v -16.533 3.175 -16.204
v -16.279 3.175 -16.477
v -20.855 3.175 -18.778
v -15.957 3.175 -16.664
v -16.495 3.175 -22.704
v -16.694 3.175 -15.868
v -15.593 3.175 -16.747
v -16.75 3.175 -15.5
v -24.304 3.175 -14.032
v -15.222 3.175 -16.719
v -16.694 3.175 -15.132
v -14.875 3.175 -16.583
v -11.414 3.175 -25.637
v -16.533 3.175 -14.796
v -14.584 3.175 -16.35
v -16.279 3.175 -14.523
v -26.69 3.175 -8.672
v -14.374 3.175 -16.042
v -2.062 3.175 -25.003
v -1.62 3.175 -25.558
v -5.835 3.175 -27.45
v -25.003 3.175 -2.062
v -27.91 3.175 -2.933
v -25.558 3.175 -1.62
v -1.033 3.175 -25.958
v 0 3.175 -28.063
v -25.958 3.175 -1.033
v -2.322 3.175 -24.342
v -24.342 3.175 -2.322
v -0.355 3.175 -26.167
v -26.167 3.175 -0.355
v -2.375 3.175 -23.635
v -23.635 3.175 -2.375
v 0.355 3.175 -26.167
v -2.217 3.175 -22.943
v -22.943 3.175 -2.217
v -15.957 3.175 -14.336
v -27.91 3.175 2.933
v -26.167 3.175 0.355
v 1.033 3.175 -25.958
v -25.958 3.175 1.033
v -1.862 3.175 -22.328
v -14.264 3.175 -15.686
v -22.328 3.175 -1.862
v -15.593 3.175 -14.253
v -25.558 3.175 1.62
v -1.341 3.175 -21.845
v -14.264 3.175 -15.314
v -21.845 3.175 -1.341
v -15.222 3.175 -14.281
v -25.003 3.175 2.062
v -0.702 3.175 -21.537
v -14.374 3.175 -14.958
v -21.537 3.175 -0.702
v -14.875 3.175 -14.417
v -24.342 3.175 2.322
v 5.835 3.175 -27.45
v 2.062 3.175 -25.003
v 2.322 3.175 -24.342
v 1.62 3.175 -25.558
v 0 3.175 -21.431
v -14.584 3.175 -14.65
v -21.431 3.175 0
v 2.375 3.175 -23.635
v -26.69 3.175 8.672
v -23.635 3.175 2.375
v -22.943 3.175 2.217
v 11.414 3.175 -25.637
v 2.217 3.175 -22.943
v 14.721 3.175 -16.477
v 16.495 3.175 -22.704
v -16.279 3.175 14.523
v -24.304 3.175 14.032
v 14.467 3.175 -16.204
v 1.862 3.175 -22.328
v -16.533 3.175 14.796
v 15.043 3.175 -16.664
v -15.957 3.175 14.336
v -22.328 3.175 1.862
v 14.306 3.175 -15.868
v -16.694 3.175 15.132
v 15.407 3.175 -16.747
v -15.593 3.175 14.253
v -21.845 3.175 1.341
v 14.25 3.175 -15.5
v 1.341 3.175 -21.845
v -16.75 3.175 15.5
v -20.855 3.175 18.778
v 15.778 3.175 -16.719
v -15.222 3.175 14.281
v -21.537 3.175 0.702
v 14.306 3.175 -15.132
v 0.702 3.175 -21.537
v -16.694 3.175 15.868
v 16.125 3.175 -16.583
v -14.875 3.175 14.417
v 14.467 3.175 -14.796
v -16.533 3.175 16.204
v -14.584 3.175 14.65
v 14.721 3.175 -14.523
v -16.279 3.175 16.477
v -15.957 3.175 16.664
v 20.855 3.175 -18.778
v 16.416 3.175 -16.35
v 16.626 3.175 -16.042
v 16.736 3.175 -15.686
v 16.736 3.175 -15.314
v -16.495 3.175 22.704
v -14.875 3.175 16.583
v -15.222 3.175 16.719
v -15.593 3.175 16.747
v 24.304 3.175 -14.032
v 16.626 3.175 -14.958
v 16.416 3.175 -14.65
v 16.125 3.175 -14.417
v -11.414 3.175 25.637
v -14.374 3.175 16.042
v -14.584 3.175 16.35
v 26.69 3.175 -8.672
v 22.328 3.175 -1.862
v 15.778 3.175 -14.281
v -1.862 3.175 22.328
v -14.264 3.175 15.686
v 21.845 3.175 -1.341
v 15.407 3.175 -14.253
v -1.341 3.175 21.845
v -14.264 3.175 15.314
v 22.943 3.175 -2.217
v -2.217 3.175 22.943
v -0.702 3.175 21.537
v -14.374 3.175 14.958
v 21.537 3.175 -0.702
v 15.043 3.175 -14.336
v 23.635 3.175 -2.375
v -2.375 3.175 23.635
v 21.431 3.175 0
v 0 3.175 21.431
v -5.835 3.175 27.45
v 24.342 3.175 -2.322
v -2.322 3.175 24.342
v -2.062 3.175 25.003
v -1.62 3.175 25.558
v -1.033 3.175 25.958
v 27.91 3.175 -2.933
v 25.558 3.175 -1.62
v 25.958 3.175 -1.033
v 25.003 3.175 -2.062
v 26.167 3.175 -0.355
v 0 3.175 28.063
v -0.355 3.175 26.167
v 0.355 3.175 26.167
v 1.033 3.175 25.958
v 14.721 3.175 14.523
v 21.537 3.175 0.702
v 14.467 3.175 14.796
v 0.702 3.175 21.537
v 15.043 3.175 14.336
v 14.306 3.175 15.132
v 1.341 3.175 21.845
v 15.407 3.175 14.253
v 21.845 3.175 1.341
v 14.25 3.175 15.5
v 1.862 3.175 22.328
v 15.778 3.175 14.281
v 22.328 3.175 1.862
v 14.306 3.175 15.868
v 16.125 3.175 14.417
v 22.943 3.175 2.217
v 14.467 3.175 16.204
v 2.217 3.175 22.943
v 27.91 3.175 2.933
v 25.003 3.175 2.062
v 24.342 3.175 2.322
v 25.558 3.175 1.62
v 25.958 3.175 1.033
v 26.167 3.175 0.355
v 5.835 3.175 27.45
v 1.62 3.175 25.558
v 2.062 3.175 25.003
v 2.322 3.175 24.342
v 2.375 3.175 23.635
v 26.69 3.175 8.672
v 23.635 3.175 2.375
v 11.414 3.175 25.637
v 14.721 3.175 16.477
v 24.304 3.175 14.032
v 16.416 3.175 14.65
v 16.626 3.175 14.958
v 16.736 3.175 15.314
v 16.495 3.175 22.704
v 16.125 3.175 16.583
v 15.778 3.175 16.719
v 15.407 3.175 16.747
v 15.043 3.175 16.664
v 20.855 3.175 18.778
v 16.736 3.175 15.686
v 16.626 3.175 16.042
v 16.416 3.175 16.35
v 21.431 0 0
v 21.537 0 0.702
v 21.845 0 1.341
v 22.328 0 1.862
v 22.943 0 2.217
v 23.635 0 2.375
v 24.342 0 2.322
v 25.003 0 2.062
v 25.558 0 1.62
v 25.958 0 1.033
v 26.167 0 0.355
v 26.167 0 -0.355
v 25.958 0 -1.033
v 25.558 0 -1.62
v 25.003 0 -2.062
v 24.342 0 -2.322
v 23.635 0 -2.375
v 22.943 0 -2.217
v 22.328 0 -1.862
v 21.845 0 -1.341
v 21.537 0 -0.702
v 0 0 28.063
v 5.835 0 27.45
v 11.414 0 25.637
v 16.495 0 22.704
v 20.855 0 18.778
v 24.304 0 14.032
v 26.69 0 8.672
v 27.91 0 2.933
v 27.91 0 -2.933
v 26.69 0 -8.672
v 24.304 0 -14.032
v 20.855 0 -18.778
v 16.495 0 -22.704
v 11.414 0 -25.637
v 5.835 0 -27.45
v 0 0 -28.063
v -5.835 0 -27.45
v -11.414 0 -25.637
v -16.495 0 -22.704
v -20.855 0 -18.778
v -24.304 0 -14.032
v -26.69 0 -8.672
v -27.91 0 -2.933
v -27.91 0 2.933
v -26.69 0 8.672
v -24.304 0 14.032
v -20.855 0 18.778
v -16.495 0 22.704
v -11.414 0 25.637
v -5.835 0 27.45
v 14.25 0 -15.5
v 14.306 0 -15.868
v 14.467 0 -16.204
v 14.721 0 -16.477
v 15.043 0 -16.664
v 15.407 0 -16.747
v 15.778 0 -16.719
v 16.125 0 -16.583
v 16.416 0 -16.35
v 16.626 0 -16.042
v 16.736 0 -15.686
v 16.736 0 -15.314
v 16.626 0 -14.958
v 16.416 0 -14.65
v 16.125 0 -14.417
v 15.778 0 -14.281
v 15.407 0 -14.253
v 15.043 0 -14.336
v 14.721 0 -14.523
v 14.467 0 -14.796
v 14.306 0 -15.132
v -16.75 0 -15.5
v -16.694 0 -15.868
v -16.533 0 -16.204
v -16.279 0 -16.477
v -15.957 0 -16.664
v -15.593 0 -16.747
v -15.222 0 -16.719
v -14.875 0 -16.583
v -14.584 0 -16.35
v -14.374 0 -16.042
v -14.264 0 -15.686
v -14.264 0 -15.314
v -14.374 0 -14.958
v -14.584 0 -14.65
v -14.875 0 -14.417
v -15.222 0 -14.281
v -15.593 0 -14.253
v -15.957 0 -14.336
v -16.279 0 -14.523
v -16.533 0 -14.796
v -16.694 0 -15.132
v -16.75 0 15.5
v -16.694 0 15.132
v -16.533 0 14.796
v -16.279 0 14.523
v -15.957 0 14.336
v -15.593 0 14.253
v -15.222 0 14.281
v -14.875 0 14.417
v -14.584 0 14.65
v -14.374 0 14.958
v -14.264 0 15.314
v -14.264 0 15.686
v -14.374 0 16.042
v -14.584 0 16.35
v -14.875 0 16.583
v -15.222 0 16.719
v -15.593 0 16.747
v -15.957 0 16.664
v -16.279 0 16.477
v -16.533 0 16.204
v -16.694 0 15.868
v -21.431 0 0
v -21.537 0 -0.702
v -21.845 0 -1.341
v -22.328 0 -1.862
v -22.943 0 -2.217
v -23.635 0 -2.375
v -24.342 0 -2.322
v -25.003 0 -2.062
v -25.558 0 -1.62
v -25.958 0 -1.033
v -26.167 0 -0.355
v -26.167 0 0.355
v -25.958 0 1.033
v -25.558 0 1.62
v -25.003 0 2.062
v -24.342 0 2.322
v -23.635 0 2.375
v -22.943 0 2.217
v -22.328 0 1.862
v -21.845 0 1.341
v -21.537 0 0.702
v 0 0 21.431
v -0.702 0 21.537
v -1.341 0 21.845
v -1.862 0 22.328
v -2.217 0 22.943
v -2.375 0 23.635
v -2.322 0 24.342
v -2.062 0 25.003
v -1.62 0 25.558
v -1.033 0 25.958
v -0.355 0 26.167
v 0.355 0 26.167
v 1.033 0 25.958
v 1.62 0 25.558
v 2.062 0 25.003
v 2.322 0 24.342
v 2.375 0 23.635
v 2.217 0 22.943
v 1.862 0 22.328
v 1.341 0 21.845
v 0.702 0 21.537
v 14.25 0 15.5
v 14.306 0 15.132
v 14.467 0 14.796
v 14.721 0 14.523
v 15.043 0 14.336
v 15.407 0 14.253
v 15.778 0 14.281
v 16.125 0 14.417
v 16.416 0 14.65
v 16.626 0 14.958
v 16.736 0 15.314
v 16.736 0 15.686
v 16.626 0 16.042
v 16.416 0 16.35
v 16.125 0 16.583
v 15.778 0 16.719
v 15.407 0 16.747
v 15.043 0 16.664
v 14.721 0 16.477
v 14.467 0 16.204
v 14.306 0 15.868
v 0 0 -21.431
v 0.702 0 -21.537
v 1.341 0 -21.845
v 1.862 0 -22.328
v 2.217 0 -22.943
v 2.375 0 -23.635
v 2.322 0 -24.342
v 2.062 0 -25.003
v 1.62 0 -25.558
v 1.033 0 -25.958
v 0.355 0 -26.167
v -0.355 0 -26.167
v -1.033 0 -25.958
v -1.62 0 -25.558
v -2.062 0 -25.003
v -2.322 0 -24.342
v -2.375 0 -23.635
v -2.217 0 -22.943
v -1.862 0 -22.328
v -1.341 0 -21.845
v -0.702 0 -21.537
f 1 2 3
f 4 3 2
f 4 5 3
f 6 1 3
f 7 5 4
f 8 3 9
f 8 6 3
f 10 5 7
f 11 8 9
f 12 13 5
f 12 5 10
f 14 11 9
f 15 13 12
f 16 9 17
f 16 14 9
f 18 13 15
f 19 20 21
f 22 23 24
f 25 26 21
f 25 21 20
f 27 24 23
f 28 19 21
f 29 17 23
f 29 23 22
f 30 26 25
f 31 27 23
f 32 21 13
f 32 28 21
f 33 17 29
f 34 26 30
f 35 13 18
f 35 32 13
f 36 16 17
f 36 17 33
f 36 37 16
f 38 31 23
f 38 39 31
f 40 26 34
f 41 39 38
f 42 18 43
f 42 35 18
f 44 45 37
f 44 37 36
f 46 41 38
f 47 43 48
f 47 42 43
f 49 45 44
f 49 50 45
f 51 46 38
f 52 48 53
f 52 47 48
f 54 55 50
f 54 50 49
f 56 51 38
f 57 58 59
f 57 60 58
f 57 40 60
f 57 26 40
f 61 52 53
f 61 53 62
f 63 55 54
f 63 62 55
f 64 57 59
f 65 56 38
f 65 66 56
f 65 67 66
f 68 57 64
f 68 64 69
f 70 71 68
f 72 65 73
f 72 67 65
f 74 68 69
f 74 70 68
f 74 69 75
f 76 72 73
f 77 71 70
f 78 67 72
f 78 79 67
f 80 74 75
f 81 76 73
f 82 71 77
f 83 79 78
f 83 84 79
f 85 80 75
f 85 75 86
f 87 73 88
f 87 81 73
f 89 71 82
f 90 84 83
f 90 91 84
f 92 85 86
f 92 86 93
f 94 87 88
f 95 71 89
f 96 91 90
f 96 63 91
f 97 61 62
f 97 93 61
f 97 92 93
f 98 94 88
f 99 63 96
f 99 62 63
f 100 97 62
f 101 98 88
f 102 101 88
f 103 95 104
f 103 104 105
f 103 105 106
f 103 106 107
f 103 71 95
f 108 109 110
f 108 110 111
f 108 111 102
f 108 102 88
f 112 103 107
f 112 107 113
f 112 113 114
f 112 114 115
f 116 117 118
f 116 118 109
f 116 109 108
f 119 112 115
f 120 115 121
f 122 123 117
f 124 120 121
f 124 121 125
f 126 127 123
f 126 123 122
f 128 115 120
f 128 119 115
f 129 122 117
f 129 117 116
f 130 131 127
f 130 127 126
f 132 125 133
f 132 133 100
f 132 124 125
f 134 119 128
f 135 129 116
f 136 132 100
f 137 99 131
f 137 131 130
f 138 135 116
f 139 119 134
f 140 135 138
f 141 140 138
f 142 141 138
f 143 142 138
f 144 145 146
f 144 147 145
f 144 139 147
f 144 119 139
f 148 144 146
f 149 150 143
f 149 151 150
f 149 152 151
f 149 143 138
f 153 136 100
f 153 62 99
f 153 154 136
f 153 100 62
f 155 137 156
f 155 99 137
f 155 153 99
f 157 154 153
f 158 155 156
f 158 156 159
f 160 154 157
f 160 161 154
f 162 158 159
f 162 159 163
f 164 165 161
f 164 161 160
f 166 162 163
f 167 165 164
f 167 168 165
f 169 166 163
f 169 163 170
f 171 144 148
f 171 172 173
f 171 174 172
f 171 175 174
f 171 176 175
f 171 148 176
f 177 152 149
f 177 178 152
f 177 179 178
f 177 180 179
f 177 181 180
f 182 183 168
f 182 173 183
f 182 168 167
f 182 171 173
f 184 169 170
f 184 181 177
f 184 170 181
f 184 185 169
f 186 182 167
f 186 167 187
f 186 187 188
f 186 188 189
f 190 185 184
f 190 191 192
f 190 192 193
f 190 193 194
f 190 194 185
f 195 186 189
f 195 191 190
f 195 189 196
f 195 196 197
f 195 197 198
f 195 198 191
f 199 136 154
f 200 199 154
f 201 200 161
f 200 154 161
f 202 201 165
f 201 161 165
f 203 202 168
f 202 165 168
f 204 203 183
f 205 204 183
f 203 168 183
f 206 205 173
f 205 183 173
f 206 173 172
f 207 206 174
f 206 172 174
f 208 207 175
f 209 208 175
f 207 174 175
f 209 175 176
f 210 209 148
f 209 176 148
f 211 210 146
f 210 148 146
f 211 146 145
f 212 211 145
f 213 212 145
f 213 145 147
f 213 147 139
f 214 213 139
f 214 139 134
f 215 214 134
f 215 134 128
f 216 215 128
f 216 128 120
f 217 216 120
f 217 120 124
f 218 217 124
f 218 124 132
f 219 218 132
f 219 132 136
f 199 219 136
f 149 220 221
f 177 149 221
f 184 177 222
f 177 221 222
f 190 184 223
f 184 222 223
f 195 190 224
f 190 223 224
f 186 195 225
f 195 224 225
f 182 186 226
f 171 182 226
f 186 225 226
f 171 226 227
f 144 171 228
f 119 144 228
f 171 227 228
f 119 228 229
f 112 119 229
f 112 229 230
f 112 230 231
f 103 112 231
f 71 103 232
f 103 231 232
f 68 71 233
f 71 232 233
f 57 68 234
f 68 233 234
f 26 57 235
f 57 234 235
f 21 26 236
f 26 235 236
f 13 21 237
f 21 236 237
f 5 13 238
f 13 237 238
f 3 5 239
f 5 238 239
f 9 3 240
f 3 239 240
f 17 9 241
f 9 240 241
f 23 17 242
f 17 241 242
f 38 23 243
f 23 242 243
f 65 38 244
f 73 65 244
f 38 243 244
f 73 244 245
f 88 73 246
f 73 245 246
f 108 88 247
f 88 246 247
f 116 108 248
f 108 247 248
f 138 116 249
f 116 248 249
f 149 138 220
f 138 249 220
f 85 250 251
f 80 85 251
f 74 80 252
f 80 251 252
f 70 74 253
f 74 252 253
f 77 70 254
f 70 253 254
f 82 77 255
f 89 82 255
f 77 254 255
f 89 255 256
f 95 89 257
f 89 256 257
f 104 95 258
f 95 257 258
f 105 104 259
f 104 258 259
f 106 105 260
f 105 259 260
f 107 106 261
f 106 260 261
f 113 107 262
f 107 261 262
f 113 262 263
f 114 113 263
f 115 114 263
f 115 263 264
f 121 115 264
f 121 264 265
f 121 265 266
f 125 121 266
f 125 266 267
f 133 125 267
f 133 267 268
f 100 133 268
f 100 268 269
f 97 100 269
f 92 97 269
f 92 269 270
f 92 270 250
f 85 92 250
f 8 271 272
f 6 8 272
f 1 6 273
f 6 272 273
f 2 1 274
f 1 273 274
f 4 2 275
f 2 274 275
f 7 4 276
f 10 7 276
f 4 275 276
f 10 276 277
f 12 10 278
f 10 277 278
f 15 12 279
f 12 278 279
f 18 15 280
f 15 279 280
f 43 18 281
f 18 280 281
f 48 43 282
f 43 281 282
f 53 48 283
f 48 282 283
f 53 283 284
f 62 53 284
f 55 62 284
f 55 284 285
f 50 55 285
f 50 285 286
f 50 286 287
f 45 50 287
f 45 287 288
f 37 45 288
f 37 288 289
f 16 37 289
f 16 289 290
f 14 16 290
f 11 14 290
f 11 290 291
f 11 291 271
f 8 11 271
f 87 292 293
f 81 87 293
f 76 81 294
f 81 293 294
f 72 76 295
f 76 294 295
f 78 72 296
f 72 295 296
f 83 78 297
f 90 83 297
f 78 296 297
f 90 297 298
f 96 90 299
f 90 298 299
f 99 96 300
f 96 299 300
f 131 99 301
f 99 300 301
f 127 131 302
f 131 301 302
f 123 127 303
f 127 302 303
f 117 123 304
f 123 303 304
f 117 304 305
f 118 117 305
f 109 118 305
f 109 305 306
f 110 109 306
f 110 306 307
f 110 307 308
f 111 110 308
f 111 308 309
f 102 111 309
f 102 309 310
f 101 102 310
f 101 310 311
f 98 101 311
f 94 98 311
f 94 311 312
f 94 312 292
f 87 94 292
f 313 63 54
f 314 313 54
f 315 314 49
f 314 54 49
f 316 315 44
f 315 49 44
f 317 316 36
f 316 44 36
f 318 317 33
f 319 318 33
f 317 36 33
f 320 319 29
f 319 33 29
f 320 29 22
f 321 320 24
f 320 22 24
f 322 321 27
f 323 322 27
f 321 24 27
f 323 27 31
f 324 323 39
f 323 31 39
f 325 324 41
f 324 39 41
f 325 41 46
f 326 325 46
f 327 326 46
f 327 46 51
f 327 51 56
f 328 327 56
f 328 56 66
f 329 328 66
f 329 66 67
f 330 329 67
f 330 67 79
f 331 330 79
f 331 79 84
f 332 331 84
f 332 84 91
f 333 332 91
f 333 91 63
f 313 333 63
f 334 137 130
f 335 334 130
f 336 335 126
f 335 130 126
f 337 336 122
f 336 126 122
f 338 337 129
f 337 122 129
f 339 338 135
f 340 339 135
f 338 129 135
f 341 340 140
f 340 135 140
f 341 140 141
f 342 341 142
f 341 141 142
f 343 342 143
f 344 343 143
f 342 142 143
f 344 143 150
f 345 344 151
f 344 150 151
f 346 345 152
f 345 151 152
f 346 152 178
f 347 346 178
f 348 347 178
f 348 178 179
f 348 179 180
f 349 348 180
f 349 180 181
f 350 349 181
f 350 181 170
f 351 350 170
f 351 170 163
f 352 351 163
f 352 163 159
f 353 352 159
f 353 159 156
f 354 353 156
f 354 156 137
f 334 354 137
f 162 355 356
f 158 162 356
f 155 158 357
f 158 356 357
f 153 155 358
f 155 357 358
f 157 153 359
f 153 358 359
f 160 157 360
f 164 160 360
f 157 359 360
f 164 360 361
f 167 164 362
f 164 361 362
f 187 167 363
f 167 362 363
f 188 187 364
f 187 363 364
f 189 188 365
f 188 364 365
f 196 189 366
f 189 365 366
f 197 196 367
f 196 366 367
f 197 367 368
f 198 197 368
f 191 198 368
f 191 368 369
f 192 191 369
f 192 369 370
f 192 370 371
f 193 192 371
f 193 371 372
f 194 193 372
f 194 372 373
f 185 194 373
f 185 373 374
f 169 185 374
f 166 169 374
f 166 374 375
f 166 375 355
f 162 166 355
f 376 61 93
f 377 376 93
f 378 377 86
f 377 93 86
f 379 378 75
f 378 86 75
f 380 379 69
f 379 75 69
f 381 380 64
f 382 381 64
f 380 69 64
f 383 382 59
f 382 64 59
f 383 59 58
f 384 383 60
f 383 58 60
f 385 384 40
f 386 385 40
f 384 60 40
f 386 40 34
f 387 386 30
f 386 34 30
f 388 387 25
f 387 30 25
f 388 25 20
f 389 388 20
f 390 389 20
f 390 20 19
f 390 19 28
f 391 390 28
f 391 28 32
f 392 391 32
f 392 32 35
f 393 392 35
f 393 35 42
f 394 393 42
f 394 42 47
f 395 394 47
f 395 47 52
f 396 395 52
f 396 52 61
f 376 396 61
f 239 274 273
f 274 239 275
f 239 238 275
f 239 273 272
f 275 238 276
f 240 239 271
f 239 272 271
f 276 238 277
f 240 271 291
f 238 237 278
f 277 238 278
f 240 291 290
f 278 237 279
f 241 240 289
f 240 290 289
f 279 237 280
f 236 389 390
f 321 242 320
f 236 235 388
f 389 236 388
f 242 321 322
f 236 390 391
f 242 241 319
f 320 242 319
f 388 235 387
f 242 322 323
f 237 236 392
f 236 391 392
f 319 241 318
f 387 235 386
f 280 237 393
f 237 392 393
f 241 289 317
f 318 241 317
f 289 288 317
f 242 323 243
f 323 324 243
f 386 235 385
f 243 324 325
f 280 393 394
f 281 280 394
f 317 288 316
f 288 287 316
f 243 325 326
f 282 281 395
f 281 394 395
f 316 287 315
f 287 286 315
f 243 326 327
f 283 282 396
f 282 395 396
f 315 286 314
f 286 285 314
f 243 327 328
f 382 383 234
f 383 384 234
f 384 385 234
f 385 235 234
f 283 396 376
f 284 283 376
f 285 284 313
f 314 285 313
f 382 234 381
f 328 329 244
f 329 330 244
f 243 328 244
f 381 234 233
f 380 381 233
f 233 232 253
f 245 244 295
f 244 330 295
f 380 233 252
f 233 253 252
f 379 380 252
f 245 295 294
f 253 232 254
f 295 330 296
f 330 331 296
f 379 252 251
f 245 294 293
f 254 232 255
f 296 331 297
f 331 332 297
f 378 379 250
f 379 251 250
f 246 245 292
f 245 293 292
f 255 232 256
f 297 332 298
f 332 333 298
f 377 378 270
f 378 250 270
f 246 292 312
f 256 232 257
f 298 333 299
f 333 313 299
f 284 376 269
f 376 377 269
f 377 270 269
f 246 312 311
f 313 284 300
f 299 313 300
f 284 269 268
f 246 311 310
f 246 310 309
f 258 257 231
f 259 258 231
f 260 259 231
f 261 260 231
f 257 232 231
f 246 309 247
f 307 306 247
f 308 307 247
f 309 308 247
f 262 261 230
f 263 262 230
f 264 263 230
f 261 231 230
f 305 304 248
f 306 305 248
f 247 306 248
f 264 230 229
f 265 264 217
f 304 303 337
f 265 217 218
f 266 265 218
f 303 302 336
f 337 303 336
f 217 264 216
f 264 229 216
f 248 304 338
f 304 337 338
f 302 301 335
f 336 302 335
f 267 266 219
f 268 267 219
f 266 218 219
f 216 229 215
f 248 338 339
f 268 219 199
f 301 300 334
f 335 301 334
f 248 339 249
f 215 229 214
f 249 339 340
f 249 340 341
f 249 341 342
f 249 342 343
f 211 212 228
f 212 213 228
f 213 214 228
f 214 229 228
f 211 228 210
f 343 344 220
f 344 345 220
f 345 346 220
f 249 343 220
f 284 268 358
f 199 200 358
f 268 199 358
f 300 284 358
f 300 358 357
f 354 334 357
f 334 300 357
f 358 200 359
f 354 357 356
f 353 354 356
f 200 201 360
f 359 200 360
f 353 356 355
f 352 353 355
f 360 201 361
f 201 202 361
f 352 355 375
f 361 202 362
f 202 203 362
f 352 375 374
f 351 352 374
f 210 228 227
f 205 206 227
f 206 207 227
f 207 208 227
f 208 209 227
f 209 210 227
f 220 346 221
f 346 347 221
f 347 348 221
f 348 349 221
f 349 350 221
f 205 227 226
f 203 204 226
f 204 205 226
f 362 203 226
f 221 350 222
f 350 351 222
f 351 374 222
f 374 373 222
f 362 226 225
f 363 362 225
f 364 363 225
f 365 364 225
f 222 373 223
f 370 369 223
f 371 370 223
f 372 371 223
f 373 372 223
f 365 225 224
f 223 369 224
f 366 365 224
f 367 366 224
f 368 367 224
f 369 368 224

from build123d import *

# Parameters (mm, degrees)
SKETCH1_R                 = 28.063300378
BOSS_EXTRUDE1_DEPTH       = 3.175
M3X0_5_TAPPED_HOLE1_D     = 2.5
M3X0_5_TAPPED_HOLE1_DEPTH = 7.62
M3X0_5_TAPPED_HOLE1_TIP   = 0.751075774
SKETCH5_R                 = 2.38125
CUT_EXTRUDE1_DEPTH        = 40.814297448
CIRPATTERN1_COUNT         = 4


with BuildPart() as part:
    # Sketch1 → Boss-Extrude1 (new body)
    with BuildSketch(Plane(origin=(0, 0, 0), x_dir=(1, 0, 0), z_dir=(0, 1, 0))):
        with Locations(Location((0, 0, 0), (0, 0, 270))):
            Circle(SKETCH1_R)
    extrude(amount=BOSS_EXTRUDE1_DEPTH)

    # M3x0.5 Tapped Hole1
    with Locations(Plane(origin=(0, 3.175, 0), x_dir=(1, 0, 0), z_dir=(0, 1, 0))):
        with Locations((-15.5, 15.5), (15.5, -15.5), (15.5, 15.5), (-15.5, -15.5)):
            Hole(M3X0_5_TAPPED_HOLE1_D / 2, depth=M3X0_5_TAPPED_HOLE1_DEPTH)
            with Locations((0, 0, -(M3X0_5_TAPPED_HOLE1_DEPTH + M3X0_5_TAPPED_HOLE1_TIP / 2))):  # 118° drill point
                Cone(0, M3X0_5_TAPPED_HOLE1_D / 2, M3X0_5_TAPPED_HOLE1_TIP, mode=Mode.SUBTRACT)

    # Sketch5 → Cut-Extrude1 (cut, through all)
    with BuildSketch(Plane(origin=(0, 3.175, 0), x_dir=(1, 0, 0), z_dir=(0, 1, 0))):
        with Locations(Location((0, 23.8125, 0), (0, 0, 270))):
            Circle(SKETCH5_R)
    cut_extrude1 = extrude(amount=-CUT_EXTRUDE1_DEPTH, mode=Mode.SUBTRACT)

    # CirPattern1: Cut-Extrude1 ×4 about axis
    cirpattern1_axis = Axis((0, 0, 0), (0, 1, 0))
    for i in range(1, CIRPATTERN1_COUNT):
        add(cut_extrude1.rotate(cirpattern1_axis, i * 360 / CIRPATTERN1_COUNT), mode=Mode.SUBTRACT)


solid = part.part
